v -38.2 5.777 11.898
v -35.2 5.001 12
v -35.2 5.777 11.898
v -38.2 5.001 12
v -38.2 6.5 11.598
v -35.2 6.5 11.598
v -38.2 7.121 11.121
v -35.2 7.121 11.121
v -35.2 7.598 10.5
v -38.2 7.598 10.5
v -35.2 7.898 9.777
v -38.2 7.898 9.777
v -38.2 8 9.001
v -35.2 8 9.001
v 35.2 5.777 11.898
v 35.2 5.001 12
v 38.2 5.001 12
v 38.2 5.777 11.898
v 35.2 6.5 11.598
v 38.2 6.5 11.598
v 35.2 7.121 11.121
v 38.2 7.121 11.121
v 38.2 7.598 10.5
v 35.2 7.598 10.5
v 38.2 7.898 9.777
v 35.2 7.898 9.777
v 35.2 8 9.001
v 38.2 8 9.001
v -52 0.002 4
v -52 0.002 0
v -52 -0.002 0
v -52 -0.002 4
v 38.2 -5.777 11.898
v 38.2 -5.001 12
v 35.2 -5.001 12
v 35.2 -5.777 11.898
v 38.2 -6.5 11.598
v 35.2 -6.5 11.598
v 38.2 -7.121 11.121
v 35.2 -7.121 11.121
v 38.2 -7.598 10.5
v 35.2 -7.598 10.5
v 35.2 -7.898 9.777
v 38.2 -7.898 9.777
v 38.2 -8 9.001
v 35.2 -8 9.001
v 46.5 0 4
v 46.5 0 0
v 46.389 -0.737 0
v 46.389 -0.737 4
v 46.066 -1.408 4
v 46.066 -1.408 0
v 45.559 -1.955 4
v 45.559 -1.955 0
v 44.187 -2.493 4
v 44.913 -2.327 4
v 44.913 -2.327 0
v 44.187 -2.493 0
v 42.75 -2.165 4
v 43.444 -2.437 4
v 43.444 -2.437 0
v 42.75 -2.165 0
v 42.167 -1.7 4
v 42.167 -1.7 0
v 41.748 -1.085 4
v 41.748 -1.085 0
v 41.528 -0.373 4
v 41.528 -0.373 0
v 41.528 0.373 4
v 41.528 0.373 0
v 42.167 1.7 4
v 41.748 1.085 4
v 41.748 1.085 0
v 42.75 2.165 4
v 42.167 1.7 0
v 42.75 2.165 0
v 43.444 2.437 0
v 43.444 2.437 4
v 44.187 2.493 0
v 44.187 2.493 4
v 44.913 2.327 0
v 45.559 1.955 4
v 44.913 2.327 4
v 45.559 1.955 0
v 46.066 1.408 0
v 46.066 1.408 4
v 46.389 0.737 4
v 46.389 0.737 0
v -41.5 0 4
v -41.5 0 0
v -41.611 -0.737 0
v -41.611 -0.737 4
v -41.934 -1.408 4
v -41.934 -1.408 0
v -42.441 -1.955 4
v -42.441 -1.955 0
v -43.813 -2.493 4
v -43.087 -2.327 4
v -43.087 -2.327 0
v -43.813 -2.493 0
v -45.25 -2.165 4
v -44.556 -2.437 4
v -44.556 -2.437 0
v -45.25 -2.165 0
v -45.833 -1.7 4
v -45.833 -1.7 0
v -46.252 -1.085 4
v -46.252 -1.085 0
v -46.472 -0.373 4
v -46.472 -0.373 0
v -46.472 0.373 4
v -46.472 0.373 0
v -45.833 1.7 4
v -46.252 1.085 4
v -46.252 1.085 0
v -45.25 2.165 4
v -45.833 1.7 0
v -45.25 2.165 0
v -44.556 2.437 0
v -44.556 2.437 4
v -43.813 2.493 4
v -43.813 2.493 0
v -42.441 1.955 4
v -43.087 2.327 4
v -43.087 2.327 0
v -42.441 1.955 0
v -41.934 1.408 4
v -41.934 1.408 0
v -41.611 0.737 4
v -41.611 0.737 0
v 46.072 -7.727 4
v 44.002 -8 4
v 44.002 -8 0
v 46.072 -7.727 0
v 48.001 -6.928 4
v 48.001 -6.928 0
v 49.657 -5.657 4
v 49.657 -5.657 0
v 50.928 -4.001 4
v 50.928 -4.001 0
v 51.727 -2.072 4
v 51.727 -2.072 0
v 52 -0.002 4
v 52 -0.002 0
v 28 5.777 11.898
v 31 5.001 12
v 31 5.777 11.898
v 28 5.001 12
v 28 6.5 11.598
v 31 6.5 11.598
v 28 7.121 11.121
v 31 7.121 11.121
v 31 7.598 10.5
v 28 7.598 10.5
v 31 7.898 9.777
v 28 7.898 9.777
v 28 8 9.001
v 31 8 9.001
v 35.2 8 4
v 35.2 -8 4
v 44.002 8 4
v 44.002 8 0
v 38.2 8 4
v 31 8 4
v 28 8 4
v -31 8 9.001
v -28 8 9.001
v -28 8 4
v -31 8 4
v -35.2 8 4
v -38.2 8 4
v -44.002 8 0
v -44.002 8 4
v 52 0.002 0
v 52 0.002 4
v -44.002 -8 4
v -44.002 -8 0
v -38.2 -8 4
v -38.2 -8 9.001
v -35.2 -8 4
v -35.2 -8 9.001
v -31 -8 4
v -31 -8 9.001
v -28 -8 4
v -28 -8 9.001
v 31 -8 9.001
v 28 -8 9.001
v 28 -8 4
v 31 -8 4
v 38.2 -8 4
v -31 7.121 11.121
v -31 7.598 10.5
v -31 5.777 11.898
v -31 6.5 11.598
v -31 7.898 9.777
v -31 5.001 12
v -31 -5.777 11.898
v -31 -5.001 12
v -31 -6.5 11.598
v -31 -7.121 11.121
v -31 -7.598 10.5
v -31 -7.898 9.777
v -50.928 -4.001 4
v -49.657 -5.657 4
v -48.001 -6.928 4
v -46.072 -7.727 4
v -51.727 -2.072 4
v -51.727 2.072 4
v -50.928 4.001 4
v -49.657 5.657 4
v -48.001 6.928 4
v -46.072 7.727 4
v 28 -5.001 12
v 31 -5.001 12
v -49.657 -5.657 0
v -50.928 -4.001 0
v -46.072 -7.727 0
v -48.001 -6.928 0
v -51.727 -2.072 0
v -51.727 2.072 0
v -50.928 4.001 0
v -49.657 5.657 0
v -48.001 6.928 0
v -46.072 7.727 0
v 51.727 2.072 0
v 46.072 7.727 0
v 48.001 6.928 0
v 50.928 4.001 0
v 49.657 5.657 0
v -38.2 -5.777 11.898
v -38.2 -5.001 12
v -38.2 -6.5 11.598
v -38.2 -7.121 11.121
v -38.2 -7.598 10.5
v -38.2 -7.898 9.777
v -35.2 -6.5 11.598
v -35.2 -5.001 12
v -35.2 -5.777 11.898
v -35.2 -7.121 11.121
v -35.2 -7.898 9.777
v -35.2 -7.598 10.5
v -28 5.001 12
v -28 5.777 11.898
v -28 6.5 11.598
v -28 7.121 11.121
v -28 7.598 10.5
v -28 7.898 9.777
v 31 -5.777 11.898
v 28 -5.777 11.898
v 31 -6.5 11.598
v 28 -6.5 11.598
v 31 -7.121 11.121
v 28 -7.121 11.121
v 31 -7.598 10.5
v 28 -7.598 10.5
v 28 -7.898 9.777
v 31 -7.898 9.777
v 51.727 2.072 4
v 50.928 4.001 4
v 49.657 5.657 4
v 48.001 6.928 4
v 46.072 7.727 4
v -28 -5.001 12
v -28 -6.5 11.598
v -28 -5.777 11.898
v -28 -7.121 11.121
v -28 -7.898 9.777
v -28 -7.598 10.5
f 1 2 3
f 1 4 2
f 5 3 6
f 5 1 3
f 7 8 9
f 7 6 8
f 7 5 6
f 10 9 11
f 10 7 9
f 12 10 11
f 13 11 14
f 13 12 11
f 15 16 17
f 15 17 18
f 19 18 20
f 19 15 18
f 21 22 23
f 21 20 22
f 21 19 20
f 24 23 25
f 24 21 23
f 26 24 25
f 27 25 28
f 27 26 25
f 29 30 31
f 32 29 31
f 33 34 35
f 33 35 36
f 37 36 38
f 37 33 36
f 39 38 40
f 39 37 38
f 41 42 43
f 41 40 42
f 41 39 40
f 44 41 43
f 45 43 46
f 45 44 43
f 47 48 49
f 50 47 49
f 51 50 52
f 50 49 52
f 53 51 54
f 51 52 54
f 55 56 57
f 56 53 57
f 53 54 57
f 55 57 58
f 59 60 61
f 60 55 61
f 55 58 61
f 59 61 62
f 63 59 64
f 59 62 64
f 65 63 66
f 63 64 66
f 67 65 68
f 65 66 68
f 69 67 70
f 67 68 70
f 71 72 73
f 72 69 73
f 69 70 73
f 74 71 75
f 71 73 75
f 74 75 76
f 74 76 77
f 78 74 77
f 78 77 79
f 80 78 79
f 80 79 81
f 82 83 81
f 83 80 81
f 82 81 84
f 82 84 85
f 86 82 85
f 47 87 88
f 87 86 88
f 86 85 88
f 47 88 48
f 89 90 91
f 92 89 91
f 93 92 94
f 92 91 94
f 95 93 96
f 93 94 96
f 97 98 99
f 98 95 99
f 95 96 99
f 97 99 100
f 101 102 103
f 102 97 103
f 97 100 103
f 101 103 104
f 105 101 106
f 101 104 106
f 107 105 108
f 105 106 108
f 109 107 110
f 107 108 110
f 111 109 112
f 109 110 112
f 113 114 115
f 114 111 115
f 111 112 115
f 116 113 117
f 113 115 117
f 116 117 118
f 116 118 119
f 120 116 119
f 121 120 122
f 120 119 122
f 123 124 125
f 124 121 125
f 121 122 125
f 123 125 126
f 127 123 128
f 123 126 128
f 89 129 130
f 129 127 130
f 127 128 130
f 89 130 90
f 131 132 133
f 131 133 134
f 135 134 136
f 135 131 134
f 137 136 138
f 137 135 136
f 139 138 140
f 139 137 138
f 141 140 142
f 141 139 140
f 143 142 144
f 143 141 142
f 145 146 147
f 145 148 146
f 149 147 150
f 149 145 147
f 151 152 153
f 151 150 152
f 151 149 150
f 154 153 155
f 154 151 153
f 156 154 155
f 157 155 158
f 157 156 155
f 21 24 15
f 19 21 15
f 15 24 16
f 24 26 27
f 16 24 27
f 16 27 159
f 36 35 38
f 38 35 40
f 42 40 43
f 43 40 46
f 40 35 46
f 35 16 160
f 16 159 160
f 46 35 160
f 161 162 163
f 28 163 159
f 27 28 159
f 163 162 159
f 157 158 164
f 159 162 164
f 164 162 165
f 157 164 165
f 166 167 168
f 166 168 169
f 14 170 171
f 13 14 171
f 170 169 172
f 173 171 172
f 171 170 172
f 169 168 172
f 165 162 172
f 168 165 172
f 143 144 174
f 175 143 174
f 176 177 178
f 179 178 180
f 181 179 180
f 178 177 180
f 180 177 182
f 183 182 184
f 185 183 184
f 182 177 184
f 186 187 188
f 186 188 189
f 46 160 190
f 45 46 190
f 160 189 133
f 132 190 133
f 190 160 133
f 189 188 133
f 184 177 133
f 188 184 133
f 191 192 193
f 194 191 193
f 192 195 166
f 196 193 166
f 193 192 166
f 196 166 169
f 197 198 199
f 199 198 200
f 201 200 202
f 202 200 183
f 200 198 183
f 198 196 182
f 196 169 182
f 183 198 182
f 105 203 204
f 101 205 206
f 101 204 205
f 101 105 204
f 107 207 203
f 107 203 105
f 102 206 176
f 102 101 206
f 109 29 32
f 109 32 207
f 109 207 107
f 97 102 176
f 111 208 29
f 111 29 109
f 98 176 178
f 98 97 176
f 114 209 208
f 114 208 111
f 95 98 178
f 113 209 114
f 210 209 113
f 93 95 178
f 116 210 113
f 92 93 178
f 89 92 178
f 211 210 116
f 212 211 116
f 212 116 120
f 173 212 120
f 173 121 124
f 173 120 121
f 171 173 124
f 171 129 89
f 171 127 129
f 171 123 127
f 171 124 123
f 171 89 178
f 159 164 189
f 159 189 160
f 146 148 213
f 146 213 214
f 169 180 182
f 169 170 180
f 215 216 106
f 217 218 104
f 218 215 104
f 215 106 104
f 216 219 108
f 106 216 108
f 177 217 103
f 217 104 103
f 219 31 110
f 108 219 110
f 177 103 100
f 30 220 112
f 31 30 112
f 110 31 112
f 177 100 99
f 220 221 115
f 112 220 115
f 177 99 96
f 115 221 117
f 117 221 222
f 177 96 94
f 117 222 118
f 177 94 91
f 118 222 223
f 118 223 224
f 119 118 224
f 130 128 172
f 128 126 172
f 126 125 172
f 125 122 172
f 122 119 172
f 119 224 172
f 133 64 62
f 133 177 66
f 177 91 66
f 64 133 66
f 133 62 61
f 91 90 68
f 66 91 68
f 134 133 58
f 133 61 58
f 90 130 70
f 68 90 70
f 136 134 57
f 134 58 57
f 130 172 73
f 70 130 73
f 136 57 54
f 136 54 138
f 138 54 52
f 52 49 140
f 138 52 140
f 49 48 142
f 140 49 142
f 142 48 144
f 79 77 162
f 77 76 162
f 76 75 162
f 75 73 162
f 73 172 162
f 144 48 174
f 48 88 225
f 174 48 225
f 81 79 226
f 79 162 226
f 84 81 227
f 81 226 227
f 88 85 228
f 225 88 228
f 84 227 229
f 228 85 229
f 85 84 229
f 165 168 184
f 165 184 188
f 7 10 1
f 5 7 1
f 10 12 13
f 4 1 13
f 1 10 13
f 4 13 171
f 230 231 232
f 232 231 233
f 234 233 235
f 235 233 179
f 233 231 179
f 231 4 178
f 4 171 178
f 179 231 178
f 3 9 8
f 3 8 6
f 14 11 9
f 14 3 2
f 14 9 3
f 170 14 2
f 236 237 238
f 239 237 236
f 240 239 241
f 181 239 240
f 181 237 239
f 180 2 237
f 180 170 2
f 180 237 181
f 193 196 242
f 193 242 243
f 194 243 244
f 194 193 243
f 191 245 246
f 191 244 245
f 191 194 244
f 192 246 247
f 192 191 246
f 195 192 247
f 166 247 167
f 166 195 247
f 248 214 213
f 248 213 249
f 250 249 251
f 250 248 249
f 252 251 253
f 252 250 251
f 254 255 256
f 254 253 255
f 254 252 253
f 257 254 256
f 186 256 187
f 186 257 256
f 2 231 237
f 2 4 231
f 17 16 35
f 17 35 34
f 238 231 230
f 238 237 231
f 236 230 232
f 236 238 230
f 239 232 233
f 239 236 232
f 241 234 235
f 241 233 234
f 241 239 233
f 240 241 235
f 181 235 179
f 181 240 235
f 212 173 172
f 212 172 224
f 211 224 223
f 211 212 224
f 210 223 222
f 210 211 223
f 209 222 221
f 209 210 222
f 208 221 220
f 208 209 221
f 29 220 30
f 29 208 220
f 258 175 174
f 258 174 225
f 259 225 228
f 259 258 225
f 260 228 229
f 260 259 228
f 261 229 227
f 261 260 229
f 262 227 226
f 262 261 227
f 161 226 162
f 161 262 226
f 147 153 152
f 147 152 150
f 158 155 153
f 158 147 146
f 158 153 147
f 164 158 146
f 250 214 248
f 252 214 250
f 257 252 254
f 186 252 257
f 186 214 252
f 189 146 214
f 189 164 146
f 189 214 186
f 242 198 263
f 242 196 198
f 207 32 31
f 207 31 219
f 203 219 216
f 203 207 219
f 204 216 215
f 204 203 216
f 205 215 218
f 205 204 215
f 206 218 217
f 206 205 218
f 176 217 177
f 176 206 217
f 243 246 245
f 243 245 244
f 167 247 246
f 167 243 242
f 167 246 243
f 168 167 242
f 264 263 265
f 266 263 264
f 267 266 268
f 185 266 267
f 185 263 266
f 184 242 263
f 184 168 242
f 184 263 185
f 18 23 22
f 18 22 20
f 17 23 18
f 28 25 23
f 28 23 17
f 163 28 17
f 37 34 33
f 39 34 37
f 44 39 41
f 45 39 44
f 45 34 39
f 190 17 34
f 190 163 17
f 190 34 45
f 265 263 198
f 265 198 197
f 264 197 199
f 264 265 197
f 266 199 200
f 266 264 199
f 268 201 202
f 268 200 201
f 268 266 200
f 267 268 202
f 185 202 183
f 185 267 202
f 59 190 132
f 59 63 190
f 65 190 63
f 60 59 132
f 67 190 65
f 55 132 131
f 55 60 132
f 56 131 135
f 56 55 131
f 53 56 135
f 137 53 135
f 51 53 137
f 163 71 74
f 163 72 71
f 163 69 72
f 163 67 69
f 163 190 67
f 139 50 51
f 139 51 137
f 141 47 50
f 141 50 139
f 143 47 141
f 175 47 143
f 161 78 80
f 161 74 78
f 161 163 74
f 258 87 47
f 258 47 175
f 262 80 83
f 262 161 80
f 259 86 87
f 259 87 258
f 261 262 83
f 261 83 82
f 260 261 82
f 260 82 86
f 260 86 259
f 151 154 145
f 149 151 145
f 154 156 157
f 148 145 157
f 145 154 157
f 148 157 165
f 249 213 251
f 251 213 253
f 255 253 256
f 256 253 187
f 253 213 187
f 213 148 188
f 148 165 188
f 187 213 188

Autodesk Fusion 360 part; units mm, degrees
sketch "Sketch1" plane through (0, 0, 0) normal (0, 0, 1) x (1, 0, 0)
  line L0 (52, 8) -> (-52, 8)
  line L1 (-52, 8) -> (-52, -8)
  line L2 (-52, -8) -> (52, -8)
  line L3 (52, -8) -> (52, 8)
  line L4 (52, 8) -> (-52, -8) construction
  line L5 (-52, 8) -> (52, -8) construction
  circle A0 centre (-44, 0) radius 2.5
  line L6 (-38.2, 8) -> (-38.2, -8)
  line L7 (-35.2, 8) -> (-35.2, -8)
  line L8 (-31, 8) -> (-31, -8)
  line L9 (-28, 8) -> (-28, -8)
  line L10 (0, 1.75) -> (0, 22.5)
  line L11 (28, 8) -> (28, -8)
  line L12 (31, 8) -> (31, -8)
  line L13 (35.2, 8) -> (35.2, -8)
  line L14 (38.2, 8) -> (38.2, -8)
  circle A1 centre (44, 0) radius 2.5
  dimension "d1" = 104
  dimension "d2" = 16
  dimension "d3" = 5
  dimension "d4" = 8
  dimension "d6" = 3
  dimension "d7" = 31
  dimension "d8" = 3
  dimension "d9" = 4.2
extrude "Extrude1" add sketch "Sketch1" along normal blind 4
extrude "Extrude2" add sketch "Sketch1" along normal blind 12 contours L0 L2 L13 L14 | L0 L2 L11 L12 | L0 L2 L8 L9 | L0 L2 L6 L7
fillet "Fillet1" radius 8 4 edges at (-52, -8, 2) (-52, 8, 2) (52, 8, 2) (52, -8, 2)
fillet "Fillet1" radius 3 8 edges at (-36.7, -8, 12) (-36.7, 8, 12) (-29.5, -8, 12) (-29.5, 8, 12) (29.5, 8, 12) (29.5, -8, 12) (36.7, -8, 12) (36.7, 8, 12)
